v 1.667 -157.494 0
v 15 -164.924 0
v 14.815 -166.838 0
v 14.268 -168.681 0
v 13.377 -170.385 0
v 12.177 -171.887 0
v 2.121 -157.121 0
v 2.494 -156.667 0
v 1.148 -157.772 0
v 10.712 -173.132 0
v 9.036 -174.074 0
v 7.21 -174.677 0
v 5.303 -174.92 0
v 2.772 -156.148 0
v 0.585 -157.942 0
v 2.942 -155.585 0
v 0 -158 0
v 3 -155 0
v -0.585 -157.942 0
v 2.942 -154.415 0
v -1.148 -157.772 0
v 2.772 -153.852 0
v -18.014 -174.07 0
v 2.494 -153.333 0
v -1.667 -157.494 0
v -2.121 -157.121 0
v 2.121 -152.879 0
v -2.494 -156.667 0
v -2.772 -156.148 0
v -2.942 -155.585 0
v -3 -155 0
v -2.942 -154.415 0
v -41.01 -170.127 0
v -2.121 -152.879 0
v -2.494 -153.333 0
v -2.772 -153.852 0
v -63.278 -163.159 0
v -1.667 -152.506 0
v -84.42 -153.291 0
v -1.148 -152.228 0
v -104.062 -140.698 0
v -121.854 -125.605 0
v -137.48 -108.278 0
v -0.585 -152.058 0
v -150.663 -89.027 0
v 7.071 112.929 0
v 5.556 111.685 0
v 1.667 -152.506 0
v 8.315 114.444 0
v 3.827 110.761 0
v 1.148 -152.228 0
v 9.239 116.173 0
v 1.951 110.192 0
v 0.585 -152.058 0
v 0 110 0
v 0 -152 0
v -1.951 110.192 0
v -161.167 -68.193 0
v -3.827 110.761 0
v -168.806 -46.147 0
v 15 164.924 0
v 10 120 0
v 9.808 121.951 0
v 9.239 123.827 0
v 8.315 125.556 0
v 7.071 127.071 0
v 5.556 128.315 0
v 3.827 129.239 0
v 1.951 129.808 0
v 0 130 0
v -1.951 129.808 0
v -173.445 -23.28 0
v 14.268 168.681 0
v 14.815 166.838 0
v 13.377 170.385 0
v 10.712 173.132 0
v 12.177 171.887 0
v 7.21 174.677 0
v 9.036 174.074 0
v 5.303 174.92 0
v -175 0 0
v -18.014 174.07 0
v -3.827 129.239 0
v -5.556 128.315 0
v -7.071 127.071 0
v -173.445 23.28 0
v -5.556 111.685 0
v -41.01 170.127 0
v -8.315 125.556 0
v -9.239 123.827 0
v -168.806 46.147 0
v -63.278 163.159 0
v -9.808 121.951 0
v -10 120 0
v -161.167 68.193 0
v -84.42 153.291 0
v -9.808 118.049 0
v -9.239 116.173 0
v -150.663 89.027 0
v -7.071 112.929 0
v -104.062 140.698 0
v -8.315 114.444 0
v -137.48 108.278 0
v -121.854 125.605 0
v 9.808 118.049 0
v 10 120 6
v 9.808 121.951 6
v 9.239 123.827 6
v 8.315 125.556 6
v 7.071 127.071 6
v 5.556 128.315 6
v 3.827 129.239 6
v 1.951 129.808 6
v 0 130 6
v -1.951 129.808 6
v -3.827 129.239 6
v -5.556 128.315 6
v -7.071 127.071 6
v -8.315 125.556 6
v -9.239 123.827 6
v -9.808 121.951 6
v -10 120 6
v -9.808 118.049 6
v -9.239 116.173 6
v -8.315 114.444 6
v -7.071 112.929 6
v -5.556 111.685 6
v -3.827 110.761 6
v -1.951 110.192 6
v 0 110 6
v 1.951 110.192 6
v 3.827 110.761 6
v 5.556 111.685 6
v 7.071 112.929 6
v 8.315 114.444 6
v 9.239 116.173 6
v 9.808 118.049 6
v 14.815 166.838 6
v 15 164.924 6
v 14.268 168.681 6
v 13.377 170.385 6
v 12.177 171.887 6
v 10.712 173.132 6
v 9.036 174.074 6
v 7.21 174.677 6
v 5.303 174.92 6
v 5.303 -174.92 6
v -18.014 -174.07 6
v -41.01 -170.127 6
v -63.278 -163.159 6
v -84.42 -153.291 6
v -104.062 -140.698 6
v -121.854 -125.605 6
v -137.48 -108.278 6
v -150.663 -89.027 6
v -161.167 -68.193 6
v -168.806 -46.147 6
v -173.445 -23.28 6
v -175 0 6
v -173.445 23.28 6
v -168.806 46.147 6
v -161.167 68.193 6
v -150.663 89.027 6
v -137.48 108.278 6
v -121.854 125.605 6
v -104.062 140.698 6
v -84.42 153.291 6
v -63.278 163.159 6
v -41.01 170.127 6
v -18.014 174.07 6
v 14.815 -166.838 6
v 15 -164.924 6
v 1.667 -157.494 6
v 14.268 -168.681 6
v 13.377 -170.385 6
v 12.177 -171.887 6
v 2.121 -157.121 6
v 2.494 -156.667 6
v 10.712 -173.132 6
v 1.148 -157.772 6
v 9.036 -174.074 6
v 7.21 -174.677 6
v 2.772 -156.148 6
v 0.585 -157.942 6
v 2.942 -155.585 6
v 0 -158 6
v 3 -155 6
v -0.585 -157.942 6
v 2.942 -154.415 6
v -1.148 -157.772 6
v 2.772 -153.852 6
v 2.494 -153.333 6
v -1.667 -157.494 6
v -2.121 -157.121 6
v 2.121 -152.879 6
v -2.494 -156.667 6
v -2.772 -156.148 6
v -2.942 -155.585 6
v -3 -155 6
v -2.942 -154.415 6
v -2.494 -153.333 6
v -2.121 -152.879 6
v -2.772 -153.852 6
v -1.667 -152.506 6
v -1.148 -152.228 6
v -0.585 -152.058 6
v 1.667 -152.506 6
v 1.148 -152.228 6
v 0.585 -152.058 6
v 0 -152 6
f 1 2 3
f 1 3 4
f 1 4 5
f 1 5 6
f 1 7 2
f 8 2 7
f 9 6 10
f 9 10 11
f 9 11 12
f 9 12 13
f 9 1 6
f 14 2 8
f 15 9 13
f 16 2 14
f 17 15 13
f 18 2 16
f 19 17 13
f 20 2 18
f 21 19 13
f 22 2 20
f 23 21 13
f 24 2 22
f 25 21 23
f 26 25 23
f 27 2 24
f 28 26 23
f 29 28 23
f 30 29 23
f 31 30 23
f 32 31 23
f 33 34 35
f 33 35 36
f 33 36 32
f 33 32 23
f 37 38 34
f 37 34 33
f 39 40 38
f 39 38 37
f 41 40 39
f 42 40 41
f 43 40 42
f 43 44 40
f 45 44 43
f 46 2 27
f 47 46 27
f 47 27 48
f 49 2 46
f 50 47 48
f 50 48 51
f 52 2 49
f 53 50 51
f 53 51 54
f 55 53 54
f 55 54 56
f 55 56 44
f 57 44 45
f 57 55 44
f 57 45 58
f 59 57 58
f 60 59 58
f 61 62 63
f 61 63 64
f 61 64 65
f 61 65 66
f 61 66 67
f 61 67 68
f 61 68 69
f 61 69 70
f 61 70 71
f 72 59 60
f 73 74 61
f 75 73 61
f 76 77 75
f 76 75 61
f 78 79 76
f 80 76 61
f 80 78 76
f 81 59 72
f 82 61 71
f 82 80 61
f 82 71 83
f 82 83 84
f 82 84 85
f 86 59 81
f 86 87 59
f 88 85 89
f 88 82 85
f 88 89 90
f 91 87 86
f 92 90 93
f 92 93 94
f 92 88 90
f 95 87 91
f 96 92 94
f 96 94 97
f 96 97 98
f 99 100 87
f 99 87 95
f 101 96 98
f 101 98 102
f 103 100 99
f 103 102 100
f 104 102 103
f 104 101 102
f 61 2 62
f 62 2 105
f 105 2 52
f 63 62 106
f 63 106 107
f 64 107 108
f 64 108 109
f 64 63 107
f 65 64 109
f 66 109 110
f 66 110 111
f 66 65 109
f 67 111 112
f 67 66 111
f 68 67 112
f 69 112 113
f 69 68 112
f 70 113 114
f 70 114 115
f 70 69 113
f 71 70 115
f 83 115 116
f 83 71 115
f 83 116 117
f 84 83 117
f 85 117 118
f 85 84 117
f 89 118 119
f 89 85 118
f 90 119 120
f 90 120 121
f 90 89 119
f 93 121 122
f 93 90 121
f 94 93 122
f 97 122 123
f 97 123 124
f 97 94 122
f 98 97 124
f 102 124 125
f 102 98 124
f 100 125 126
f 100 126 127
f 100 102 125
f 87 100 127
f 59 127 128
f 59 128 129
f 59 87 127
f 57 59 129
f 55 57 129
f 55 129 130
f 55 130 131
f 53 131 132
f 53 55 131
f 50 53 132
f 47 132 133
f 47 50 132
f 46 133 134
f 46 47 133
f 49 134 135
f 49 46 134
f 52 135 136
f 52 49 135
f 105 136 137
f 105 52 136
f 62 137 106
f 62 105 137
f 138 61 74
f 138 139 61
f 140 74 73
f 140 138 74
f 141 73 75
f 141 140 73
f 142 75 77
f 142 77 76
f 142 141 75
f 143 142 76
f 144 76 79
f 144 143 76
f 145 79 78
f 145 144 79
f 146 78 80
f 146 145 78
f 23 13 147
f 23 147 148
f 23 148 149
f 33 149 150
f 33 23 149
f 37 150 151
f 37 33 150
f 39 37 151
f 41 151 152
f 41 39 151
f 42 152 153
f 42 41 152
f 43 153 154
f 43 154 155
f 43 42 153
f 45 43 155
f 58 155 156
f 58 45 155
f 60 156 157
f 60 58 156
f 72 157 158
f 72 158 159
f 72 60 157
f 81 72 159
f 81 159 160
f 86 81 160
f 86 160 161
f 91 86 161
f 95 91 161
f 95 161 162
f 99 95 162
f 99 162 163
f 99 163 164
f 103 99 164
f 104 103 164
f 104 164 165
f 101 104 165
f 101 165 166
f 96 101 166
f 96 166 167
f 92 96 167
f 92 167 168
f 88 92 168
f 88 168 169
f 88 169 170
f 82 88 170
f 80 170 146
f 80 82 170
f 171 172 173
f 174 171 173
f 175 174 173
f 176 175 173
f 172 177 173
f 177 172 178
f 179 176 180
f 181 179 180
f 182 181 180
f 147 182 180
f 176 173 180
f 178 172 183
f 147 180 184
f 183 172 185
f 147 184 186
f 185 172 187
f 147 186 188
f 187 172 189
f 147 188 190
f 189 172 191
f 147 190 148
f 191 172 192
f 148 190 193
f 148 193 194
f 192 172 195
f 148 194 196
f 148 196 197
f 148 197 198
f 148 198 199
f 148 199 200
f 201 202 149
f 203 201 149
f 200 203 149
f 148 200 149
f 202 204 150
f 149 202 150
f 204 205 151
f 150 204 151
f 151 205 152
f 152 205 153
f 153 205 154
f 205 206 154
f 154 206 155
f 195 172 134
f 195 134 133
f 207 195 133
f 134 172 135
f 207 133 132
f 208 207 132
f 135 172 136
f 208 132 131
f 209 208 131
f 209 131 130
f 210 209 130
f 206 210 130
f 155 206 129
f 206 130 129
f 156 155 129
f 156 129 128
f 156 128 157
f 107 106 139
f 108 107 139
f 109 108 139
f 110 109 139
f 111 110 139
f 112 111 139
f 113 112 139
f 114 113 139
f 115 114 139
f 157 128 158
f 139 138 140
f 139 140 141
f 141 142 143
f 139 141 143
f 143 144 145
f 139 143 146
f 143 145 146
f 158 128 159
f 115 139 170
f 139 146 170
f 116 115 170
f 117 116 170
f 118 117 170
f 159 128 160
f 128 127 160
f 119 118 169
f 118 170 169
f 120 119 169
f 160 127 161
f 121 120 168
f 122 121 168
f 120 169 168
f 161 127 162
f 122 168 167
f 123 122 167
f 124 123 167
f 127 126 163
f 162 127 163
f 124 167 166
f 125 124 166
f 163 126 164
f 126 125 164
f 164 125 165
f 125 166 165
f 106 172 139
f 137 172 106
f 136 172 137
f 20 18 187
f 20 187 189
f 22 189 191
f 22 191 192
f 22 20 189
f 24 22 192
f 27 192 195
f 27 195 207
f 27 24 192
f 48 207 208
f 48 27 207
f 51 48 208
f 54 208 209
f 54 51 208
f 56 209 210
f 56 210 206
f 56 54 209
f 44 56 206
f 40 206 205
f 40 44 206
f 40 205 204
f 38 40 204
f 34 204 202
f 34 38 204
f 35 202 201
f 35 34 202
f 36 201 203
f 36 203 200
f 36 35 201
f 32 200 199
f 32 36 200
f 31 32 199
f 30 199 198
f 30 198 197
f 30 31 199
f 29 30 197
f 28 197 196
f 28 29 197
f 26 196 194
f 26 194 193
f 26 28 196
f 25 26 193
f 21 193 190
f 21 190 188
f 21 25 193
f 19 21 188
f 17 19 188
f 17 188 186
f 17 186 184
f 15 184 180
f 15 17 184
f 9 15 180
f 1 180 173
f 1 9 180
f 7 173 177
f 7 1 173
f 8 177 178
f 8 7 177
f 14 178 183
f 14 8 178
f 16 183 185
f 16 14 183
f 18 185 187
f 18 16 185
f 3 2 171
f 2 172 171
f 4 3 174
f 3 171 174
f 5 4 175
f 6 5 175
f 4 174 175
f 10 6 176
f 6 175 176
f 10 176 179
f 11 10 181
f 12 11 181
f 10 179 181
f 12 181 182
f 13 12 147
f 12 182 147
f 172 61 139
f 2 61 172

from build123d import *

# Parameters (mm, degrees)
SKETCH1_R           = 10
SKETCH1_R_2         = 3
BOSS_EXTRUDE1_DEPTH = 6
FILLET1_R           = 10


with BuildPart() as part:
    # Sketch1 → Boss-Extrude1 (new body)
    with BuildSketch(Plane.XY):
        with BuildLine():
            Line((15, 174.355957742), (15, -174.355957742))
            ThreePointArc((15, -174.355957742), (-175, 0), (15, 174.355957742))
        make_face()
        with Locations((0, 120)):
            Circle(SKETCH1_R, mode=Mode.SUBTRACT)
        with Locations((0, -155)):
            Circle(SKETCH1_R_2, mode=Mode.SUBTRACT)
    extrude(amount=BOSS_EXTRUDE1_DEPTH)

    # Fillet1
    fillet1_edges = [part.edges().sort_by_distance(p)[0] for p in [
        (15, 174.355957742, 3),
        (15, -174.355957742, 3),
    ]]
    fillet(fillet1_edges, radius=FILLET1_R)


solid = part.part
